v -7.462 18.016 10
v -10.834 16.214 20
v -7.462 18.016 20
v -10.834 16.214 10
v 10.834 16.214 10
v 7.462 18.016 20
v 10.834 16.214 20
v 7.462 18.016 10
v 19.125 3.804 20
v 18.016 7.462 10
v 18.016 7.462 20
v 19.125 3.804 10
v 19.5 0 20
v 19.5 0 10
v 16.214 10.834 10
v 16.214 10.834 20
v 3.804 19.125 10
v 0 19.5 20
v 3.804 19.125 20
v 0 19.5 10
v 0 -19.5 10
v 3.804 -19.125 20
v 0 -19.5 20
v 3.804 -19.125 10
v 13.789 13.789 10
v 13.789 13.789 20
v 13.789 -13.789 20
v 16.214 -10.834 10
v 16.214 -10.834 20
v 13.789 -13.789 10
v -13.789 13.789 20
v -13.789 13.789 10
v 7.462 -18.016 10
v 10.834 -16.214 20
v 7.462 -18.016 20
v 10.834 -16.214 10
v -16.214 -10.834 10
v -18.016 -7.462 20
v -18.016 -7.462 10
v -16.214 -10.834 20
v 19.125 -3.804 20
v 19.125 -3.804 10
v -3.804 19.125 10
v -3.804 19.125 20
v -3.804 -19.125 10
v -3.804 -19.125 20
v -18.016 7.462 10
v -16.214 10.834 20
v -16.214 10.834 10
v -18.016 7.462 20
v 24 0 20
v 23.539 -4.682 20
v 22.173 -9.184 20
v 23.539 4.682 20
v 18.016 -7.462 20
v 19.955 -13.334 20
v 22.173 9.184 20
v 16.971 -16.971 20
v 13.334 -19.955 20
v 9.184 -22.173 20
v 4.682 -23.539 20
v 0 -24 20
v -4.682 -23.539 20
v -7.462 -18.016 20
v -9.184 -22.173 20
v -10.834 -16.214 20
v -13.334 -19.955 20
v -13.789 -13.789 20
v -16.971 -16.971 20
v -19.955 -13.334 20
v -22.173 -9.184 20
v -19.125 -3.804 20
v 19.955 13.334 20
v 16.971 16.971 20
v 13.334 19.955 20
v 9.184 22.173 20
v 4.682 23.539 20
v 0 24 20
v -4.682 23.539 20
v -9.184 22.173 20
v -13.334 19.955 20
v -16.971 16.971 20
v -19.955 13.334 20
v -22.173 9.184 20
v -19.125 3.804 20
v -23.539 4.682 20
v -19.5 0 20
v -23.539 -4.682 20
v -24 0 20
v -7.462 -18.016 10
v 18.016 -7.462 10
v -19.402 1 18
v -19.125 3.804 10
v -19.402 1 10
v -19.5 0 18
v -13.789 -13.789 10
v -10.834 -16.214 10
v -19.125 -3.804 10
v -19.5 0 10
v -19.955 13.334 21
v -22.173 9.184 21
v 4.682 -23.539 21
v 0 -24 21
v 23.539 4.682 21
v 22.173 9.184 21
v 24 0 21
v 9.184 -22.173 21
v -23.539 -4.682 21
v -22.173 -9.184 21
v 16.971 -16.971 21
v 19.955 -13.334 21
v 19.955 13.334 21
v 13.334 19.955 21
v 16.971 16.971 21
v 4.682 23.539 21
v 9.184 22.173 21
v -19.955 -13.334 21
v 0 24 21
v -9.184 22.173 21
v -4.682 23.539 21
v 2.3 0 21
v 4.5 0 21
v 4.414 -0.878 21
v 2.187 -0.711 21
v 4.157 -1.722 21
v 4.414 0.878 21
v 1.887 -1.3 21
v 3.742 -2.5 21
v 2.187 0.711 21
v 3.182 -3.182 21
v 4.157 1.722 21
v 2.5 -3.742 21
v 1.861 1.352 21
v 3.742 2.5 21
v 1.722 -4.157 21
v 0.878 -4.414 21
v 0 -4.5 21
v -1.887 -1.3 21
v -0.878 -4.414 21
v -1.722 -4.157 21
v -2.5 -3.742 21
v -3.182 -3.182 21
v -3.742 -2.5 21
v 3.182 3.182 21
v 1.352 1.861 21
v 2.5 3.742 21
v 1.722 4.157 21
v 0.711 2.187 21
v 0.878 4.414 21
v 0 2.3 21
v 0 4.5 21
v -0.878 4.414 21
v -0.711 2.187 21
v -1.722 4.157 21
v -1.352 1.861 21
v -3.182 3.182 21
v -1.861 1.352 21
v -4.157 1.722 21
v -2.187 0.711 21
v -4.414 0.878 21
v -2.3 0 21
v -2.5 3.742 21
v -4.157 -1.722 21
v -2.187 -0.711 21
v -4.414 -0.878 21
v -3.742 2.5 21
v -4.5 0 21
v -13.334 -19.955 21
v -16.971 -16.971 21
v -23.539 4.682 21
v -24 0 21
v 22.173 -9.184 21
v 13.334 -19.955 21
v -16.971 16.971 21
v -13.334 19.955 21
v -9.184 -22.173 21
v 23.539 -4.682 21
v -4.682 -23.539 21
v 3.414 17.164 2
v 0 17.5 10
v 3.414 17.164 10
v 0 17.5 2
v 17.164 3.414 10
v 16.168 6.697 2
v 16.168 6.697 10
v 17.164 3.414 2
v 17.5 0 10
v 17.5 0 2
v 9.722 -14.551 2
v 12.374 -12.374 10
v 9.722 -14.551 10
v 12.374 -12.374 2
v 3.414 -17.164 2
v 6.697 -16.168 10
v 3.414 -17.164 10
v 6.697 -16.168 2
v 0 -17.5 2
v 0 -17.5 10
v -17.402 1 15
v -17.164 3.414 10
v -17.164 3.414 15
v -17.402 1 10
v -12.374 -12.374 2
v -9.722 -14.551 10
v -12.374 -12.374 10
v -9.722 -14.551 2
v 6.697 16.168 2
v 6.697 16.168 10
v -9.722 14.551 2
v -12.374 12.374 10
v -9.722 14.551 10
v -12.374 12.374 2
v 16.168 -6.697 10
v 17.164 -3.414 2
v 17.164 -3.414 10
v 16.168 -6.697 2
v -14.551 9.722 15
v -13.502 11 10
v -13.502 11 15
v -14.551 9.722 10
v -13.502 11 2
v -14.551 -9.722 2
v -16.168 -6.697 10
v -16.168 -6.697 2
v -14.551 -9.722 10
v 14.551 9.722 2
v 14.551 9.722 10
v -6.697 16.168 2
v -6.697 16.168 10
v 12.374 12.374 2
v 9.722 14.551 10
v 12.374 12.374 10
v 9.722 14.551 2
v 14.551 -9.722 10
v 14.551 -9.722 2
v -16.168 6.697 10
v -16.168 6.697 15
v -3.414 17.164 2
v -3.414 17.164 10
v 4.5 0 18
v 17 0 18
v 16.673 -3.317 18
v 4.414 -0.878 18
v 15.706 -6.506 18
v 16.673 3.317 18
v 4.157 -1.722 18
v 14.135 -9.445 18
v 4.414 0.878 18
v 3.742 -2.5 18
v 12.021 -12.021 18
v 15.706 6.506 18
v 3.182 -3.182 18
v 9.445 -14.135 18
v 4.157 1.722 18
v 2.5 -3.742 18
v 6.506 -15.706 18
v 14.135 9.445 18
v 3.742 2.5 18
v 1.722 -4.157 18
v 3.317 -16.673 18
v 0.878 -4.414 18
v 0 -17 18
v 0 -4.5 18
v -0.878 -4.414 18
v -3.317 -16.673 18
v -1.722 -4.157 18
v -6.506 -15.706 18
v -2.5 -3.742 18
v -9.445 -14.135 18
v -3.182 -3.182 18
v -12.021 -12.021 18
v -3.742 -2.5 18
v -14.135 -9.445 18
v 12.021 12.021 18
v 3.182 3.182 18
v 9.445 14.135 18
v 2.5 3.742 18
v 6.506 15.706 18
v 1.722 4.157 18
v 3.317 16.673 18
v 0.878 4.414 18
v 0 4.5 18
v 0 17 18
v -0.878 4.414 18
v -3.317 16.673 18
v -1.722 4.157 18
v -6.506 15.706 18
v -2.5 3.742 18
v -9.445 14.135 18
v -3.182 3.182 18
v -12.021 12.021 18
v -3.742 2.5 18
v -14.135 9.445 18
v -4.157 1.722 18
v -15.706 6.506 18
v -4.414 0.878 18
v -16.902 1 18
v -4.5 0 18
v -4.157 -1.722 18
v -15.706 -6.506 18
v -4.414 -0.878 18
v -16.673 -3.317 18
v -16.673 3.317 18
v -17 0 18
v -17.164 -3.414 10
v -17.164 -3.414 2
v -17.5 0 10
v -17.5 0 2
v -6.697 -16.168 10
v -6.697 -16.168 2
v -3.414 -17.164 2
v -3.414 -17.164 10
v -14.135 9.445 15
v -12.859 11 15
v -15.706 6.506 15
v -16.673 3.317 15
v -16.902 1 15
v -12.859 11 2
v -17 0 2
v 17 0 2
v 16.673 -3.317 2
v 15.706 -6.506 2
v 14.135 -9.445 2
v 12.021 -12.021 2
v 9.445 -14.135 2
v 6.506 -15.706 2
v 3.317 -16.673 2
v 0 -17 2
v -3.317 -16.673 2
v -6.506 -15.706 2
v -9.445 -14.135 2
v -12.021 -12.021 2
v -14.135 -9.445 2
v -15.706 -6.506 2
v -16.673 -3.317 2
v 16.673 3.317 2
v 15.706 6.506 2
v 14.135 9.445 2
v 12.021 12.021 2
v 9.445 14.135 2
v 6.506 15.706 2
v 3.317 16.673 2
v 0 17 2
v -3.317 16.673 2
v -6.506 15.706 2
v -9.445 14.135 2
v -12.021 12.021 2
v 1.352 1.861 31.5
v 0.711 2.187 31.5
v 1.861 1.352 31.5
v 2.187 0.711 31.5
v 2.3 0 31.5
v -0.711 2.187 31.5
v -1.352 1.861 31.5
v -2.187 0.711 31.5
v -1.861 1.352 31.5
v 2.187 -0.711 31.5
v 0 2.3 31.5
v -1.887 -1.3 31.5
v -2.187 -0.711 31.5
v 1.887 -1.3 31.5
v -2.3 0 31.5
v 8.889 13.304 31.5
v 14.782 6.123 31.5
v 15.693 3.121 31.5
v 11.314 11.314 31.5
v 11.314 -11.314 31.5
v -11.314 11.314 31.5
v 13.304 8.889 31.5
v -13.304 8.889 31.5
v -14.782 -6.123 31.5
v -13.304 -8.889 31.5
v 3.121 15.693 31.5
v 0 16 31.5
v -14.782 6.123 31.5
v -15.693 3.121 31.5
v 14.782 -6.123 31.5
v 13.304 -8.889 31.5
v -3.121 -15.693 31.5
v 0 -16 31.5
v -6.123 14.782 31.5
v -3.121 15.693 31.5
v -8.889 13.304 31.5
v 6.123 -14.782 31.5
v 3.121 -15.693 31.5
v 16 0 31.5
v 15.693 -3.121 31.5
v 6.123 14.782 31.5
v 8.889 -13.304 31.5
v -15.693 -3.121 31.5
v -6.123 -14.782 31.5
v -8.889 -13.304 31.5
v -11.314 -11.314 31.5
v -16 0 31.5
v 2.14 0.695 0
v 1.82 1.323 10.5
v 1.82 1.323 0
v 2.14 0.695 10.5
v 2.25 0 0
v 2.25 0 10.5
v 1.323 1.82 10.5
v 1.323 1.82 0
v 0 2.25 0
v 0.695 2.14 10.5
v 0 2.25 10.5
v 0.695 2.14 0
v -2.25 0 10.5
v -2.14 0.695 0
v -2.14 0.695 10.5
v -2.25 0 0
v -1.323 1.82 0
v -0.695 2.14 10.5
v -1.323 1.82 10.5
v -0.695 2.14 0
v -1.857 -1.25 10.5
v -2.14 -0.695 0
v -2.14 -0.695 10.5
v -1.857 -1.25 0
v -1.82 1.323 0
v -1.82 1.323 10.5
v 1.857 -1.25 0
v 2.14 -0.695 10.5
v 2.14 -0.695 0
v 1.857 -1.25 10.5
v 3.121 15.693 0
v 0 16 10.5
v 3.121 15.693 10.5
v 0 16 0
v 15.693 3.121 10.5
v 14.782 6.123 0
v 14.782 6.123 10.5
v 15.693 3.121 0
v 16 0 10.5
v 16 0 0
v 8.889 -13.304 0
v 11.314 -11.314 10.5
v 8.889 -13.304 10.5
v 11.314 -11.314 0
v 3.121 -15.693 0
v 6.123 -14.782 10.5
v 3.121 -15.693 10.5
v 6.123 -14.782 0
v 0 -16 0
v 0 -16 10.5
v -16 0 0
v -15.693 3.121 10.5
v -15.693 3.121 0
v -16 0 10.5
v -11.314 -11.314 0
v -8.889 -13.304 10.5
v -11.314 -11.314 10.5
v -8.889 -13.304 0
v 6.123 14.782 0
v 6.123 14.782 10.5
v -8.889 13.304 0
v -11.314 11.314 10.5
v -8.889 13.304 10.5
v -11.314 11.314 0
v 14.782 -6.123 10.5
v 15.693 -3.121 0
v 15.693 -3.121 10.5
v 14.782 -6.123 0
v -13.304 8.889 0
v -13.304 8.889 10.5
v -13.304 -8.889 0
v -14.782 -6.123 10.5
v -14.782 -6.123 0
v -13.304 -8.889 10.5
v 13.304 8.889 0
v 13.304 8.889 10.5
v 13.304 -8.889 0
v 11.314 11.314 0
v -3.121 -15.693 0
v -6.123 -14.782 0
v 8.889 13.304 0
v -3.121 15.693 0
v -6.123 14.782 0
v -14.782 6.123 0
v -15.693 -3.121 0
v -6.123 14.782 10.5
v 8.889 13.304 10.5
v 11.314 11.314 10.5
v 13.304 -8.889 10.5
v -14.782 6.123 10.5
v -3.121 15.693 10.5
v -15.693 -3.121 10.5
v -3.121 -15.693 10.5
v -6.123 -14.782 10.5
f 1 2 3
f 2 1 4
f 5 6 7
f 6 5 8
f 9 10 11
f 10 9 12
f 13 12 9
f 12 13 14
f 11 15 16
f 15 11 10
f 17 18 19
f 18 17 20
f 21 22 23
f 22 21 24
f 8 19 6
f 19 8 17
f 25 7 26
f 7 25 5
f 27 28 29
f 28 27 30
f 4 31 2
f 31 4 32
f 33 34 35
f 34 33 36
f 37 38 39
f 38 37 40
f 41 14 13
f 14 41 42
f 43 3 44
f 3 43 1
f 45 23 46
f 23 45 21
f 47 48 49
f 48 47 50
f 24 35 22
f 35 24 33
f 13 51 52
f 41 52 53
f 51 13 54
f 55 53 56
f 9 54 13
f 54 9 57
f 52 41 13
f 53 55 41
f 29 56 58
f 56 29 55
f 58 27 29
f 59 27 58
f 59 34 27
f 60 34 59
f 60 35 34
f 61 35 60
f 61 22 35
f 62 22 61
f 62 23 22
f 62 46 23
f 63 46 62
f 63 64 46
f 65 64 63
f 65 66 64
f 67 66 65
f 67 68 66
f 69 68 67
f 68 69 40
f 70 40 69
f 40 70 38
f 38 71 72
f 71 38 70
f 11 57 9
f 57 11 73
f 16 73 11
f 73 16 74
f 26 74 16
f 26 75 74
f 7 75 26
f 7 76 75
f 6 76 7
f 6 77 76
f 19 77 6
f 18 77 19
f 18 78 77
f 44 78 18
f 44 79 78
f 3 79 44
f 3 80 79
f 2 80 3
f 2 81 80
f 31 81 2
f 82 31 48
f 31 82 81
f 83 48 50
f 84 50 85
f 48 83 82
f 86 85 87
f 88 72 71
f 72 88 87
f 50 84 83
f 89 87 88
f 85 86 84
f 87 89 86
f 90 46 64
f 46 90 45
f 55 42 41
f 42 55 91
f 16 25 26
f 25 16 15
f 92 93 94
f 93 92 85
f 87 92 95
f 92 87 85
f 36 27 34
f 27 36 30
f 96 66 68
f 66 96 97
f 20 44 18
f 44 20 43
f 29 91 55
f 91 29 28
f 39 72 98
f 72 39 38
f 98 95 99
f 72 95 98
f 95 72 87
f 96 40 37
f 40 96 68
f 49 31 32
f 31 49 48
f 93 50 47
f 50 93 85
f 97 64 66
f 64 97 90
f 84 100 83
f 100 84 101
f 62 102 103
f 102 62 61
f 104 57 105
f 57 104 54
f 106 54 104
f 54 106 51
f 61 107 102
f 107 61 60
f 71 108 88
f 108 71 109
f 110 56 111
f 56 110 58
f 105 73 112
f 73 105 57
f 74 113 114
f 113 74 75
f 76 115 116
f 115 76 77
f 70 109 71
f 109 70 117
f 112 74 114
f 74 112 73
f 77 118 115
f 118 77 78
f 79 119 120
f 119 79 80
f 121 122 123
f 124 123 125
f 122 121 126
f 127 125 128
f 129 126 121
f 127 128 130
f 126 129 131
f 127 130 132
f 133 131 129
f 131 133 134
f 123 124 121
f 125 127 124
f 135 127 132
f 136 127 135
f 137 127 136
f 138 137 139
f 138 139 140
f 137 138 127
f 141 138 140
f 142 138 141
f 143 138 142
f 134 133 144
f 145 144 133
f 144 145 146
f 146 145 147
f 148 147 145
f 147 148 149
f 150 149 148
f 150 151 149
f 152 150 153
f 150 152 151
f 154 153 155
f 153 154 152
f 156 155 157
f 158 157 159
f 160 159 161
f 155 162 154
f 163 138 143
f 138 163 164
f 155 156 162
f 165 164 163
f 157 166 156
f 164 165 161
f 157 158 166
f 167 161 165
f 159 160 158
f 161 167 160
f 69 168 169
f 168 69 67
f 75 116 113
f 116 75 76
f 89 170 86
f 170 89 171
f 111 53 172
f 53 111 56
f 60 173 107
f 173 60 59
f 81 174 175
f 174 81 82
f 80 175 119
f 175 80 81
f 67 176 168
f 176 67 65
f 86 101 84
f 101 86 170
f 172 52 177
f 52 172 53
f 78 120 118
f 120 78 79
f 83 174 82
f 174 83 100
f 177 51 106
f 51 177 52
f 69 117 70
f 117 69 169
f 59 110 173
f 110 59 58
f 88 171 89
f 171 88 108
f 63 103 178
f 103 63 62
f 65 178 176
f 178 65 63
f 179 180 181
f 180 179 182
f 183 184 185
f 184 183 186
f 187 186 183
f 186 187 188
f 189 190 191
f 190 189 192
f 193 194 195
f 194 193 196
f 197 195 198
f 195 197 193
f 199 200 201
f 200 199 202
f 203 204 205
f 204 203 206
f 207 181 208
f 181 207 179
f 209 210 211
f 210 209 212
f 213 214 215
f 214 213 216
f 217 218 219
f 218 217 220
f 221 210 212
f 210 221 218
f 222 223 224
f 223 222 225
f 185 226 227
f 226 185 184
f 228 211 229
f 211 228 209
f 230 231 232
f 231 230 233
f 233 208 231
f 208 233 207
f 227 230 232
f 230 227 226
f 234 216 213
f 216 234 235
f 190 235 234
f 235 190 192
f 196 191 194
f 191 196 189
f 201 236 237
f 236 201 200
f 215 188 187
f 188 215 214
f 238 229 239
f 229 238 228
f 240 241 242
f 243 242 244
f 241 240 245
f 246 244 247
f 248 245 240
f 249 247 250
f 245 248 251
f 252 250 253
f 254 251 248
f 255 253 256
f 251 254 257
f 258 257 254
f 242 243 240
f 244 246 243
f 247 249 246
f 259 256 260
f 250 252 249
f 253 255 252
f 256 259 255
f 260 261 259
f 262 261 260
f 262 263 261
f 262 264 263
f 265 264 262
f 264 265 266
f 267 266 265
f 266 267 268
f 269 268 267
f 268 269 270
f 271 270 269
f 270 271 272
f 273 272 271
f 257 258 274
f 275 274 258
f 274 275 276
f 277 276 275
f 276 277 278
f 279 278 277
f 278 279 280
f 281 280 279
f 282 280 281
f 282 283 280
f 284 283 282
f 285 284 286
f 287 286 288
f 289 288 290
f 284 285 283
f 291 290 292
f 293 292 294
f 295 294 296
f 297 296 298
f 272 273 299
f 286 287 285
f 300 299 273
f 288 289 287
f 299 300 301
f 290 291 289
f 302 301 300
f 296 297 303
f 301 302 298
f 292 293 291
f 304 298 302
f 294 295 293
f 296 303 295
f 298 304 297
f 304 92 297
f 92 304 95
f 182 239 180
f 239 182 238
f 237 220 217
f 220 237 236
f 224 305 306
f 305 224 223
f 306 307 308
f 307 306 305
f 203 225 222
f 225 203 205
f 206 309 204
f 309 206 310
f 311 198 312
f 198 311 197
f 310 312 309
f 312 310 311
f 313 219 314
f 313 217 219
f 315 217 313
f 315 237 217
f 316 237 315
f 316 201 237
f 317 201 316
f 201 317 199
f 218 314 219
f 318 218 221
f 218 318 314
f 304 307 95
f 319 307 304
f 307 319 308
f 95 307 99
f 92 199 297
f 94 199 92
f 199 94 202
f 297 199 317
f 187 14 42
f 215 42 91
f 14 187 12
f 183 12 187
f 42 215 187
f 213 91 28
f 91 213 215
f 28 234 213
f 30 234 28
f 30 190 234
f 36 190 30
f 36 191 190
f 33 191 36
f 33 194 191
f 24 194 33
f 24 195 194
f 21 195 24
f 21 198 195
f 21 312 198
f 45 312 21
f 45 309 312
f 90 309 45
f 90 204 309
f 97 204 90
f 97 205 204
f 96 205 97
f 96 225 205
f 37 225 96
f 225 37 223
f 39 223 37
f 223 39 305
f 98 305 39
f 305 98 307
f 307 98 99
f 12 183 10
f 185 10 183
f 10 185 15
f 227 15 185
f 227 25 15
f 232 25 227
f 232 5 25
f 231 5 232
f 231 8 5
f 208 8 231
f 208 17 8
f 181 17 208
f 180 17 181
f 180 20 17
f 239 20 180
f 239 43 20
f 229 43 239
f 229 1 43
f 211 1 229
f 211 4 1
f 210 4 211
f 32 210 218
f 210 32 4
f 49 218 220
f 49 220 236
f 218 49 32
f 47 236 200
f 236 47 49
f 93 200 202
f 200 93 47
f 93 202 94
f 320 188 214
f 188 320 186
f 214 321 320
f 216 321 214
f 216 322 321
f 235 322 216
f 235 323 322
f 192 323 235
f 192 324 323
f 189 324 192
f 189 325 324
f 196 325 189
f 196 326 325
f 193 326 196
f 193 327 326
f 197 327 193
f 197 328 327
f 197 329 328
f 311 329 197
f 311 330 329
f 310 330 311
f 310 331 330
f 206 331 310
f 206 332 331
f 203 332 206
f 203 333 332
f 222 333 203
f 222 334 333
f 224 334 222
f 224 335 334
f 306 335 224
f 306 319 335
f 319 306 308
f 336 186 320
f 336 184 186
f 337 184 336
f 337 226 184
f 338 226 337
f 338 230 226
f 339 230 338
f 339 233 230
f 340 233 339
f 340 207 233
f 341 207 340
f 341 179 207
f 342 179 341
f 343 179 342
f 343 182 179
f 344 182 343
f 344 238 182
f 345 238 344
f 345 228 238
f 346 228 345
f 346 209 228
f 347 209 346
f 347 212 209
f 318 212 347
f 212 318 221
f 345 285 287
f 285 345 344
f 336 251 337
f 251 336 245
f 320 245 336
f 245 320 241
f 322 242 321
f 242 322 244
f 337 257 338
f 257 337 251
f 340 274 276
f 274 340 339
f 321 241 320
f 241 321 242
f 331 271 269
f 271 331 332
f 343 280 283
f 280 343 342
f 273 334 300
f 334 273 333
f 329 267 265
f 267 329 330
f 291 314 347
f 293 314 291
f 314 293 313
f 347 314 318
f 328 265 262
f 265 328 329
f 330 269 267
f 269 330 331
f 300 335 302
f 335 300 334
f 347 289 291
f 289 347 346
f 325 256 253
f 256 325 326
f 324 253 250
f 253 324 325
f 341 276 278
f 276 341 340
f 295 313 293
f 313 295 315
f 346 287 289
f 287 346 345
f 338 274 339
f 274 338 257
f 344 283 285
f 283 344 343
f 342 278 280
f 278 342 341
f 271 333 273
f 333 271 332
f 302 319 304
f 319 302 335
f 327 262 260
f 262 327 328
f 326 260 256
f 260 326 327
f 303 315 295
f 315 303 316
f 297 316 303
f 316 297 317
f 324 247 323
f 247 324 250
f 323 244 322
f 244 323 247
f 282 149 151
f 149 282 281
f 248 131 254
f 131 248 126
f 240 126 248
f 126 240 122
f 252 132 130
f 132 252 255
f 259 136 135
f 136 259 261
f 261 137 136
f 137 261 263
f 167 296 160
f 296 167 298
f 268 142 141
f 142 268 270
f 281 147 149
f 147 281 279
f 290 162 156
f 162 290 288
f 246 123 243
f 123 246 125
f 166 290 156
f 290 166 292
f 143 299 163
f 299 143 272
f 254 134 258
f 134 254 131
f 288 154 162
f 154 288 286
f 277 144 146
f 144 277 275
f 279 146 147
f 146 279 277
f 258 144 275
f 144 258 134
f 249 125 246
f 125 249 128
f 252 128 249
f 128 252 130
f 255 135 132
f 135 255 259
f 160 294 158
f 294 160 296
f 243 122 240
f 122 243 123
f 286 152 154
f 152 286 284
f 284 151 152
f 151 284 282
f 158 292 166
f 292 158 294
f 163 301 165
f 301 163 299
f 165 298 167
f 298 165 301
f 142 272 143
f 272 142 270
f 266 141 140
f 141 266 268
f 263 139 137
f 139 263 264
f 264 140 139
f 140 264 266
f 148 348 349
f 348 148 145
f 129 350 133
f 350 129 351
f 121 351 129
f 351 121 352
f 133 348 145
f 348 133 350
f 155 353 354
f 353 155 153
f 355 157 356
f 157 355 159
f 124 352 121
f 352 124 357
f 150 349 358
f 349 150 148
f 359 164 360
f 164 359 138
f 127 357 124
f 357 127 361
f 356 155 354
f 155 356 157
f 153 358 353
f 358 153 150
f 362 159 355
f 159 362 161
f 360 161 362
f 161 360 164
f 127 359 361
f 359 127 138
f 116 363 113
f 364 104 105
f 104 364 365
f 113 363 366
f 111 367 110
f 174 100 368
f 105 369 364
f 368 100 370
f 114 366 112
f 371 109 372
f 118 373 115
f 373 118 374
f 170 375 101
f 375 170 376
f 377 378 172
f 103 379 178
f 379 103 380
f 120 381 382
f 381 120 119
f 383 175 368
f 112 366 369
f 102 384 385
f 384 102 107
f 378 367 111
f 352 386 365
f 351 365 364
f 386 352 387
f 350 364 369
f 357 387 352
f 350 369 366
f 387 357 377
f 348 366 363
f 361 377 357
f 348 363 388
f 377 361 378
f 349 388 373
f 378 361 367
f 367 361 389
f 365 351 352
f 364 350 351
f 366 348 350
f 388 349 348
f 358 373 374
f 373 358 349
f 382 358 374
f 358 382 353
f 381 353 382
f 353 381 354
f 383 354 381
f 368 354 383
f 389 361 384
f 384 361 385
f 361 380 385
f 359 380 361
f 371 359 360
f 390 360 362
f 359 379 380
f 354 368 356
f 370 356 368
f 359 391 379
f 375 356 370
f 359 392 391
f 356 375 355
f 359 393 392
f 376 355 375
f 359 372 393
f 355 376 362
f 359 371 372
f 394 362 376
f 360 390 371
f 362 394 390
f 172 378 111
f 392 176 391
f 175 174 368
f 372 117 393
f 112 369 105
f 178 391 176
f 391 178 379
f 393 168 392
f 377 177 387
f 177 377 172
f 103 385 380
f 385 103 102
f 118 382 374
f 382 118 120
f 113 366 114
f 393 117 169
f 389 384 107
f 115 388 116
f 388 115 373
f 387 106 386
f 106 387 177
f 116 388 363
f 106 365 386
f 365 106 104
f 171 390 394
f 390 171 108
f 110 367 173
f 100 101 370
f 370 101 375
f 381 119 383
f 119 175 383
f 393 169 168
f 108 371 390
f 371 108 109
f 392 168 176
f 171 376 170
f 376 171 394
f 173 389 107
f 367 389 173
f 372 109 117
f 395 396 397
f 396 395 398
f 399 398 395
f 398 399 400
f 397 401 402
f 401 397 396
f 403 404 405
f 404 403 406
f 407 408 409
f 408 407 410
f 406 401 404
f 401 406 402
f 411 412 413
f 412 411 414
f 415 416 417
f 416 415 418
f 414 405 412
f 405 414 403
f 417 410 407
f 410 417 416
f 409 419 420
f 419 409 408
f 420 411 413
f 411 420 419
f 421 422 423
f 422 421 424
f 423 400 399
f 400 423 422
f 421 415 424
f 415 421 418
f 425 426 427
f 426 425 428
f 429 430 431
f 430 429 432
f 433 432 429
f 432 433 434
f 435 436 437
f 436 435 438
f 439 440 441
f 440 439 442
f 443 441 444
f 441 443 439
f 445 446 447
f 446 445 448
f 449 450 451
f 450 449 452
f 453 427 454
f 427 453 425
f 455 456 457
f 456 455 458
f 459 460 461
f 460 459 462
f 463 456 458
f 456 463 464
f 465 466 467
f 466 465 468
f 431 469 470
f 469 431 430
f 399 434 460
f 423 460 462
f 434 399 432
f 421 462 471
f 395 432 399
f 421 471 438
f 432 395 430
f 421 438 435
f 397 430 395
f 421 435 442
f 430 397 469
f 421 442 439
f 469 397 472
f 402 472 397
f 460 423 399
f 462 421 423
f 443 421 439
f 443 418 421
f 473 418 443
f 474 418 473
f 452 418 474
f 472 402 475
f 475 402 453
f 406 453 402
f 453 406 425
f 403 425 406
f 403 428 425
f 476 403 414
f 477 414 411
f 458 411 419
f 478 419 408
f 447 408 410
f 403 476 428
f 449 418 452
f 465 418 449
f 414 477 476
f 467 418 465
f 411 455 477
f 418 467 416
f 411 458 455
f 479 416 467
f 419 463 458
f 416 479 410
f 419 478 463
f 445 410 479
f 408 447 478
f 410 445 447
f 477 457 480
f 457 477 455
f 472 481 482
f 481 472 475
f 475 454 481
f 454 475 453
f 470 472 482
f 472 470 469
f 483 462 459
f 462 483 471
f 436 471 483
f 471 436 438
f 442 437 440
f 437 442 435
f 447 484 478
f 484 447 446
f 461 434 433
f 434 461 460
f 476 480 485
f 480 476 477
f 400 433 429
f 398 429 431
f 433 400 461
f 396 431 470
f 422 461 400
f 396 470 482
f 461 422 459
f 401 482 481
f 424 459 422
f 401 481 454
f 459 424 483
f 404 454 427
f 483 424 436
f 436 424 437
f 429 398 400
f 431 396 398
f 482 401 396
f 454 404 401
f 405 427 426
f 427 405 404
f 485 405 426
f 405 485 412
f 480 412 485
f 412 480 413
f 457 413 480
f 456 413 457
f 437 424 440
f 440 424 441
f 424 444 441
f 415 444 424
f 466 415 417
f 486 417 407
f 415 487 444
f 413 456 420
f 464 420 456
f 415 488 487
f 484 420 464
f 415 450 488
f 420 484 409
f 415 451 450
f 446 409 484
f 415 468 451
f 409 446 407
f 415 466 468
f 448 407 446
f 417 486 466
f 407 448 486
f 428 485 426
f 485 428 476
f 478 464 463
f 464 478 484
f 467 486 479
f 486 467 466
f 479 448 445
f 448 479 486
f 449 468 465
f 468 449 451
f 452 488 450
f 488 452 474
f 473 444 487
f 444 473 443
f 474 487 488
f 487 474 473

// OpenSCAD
module test_rotator(w) {
    difference() {
        cylinder(10.5, d=32, $fn=32);
        translate([0, 0, -1])
        difference() {
            cylinder(21, d=w, $fn=20);
            translate([-w/2, -w/2, 0])
            translate([0, 0, -1])
            cube([w, 1, 25]);
        }
    }
}

module rotator_incline(w, dia1 = 32, dia2 = 32) {
    difference() {
        cylinder(10.5, d1=dia1, d2=dia2, $fn=32);
        translate([0, 0, -1])
        difference() {
            cylinder(21, d=w, $fn=20);
            translate([-w/2, -w/2, 0])
            translate([0, 0, -1])
            cube([w, 1, 25]);
        }
    }
}

//test_rotator(6.25);

module spool_male() {
    difference() {
    union() {
        difference () {
            difference() {
                // the center whole
                difference() {
                    // the spool
                    difference() {
                        // the edges
                        union() {
                            cylinder(1, d=48, $fn=32);
                            cylinder(20, d=39, $fn=32);
                            translate([0, 0, 20])
                            cylinder(1, d=48, $fn=32);
                        }
                        translate([0, 0, -1])
                        cylinder(19, d=35, $fn=32);
                    }
                }
                union() {
                    translate([-20, 0, 5])
                    cube([10,11,10]);
                    translate([-20, 0, 2])
                    cube([10, 1, 16]);
                }
            }
            translate([0, 0, -1])
            cylinder(11, d=48.5, $fn=31);
        }
        difference() {
            difference() {
                translate([0, 0, 2])
                cylinder(17, d=35, $fn=32);
                translate([0, 0, -1])
                cylinder(19, d=34, $fn=32);
            }
            // hack
            union() {
                translate([-20, 0, 1])
                //cube([10, 10, 14]);
                cube([10,11,14]);
                translate([-20, 0, 2])
                cube([10, 1, 16]);
            }
        }
    }
    translate([0, 0, -5])
    cylinder(40, d=9, $fn=32);
    }

}

module spool_female() {
    difference () {
        difference() {
            // the center whole
            difference() {
                // the spool
                difference() {
                    // the edges
                    union() {
                        cylinder(1, d=48, $fn=32);
                        cylinder(20, d=39, $fn=32);
                        translate([0, 0, 20])
                        cylinder(1, d=48, $fn=32);
                    }
                    translate([0, 0, -1])
                    cylinder(19, d=35, $fn=32);
                }
                //translate([0, 0, -5])
                cylinder(40, d=9, $fn=32);
            }
            union() {
                // Mirror!
                translate([-20, -10, 5])
                cube(10);
                translate([-20, 0, 2])
                cube([10, 1, 16]);
            }
        }
        translate([0, 0, -1])
        cylinder(11, d=48.5, $fn=31);
    }


    //difference() {
    //difference() {
    //    translate([0, 0, 2])
    //    cylinder(17, d=31, $fn=32);
    //    translate([0, 0, -1])
    //    cylinder(19, d=30, $fn=32);
    //}
    //// hack
    //union() {
    //    translate([-20, 0, 1])
    //    cube([10, 10, 14]);
    //    translate([-20, 0, 2])
    //    cube([10, 1, 16]);
    //}
    //}
}

module shaft() {
    difference() {
        union() {
        cube([40, 40, 2]);
        translate([20, 20, -40])
        cylinder(40, d=5, $fn=32);
        }
        translate([19.75, 15, -41])
        cube([0.5, 10, 10]);
    }
}

module spool_female_2()
{
spool_female();
translate([0,0,21])
//rotator_incline(6.25, 48);
rotator_incline(4.6, 48);
}
color([1,0,0]) spool_male();
color([0,1,0]) spool_female_2();
color([0,0,1]) test_rotator(4.5);
